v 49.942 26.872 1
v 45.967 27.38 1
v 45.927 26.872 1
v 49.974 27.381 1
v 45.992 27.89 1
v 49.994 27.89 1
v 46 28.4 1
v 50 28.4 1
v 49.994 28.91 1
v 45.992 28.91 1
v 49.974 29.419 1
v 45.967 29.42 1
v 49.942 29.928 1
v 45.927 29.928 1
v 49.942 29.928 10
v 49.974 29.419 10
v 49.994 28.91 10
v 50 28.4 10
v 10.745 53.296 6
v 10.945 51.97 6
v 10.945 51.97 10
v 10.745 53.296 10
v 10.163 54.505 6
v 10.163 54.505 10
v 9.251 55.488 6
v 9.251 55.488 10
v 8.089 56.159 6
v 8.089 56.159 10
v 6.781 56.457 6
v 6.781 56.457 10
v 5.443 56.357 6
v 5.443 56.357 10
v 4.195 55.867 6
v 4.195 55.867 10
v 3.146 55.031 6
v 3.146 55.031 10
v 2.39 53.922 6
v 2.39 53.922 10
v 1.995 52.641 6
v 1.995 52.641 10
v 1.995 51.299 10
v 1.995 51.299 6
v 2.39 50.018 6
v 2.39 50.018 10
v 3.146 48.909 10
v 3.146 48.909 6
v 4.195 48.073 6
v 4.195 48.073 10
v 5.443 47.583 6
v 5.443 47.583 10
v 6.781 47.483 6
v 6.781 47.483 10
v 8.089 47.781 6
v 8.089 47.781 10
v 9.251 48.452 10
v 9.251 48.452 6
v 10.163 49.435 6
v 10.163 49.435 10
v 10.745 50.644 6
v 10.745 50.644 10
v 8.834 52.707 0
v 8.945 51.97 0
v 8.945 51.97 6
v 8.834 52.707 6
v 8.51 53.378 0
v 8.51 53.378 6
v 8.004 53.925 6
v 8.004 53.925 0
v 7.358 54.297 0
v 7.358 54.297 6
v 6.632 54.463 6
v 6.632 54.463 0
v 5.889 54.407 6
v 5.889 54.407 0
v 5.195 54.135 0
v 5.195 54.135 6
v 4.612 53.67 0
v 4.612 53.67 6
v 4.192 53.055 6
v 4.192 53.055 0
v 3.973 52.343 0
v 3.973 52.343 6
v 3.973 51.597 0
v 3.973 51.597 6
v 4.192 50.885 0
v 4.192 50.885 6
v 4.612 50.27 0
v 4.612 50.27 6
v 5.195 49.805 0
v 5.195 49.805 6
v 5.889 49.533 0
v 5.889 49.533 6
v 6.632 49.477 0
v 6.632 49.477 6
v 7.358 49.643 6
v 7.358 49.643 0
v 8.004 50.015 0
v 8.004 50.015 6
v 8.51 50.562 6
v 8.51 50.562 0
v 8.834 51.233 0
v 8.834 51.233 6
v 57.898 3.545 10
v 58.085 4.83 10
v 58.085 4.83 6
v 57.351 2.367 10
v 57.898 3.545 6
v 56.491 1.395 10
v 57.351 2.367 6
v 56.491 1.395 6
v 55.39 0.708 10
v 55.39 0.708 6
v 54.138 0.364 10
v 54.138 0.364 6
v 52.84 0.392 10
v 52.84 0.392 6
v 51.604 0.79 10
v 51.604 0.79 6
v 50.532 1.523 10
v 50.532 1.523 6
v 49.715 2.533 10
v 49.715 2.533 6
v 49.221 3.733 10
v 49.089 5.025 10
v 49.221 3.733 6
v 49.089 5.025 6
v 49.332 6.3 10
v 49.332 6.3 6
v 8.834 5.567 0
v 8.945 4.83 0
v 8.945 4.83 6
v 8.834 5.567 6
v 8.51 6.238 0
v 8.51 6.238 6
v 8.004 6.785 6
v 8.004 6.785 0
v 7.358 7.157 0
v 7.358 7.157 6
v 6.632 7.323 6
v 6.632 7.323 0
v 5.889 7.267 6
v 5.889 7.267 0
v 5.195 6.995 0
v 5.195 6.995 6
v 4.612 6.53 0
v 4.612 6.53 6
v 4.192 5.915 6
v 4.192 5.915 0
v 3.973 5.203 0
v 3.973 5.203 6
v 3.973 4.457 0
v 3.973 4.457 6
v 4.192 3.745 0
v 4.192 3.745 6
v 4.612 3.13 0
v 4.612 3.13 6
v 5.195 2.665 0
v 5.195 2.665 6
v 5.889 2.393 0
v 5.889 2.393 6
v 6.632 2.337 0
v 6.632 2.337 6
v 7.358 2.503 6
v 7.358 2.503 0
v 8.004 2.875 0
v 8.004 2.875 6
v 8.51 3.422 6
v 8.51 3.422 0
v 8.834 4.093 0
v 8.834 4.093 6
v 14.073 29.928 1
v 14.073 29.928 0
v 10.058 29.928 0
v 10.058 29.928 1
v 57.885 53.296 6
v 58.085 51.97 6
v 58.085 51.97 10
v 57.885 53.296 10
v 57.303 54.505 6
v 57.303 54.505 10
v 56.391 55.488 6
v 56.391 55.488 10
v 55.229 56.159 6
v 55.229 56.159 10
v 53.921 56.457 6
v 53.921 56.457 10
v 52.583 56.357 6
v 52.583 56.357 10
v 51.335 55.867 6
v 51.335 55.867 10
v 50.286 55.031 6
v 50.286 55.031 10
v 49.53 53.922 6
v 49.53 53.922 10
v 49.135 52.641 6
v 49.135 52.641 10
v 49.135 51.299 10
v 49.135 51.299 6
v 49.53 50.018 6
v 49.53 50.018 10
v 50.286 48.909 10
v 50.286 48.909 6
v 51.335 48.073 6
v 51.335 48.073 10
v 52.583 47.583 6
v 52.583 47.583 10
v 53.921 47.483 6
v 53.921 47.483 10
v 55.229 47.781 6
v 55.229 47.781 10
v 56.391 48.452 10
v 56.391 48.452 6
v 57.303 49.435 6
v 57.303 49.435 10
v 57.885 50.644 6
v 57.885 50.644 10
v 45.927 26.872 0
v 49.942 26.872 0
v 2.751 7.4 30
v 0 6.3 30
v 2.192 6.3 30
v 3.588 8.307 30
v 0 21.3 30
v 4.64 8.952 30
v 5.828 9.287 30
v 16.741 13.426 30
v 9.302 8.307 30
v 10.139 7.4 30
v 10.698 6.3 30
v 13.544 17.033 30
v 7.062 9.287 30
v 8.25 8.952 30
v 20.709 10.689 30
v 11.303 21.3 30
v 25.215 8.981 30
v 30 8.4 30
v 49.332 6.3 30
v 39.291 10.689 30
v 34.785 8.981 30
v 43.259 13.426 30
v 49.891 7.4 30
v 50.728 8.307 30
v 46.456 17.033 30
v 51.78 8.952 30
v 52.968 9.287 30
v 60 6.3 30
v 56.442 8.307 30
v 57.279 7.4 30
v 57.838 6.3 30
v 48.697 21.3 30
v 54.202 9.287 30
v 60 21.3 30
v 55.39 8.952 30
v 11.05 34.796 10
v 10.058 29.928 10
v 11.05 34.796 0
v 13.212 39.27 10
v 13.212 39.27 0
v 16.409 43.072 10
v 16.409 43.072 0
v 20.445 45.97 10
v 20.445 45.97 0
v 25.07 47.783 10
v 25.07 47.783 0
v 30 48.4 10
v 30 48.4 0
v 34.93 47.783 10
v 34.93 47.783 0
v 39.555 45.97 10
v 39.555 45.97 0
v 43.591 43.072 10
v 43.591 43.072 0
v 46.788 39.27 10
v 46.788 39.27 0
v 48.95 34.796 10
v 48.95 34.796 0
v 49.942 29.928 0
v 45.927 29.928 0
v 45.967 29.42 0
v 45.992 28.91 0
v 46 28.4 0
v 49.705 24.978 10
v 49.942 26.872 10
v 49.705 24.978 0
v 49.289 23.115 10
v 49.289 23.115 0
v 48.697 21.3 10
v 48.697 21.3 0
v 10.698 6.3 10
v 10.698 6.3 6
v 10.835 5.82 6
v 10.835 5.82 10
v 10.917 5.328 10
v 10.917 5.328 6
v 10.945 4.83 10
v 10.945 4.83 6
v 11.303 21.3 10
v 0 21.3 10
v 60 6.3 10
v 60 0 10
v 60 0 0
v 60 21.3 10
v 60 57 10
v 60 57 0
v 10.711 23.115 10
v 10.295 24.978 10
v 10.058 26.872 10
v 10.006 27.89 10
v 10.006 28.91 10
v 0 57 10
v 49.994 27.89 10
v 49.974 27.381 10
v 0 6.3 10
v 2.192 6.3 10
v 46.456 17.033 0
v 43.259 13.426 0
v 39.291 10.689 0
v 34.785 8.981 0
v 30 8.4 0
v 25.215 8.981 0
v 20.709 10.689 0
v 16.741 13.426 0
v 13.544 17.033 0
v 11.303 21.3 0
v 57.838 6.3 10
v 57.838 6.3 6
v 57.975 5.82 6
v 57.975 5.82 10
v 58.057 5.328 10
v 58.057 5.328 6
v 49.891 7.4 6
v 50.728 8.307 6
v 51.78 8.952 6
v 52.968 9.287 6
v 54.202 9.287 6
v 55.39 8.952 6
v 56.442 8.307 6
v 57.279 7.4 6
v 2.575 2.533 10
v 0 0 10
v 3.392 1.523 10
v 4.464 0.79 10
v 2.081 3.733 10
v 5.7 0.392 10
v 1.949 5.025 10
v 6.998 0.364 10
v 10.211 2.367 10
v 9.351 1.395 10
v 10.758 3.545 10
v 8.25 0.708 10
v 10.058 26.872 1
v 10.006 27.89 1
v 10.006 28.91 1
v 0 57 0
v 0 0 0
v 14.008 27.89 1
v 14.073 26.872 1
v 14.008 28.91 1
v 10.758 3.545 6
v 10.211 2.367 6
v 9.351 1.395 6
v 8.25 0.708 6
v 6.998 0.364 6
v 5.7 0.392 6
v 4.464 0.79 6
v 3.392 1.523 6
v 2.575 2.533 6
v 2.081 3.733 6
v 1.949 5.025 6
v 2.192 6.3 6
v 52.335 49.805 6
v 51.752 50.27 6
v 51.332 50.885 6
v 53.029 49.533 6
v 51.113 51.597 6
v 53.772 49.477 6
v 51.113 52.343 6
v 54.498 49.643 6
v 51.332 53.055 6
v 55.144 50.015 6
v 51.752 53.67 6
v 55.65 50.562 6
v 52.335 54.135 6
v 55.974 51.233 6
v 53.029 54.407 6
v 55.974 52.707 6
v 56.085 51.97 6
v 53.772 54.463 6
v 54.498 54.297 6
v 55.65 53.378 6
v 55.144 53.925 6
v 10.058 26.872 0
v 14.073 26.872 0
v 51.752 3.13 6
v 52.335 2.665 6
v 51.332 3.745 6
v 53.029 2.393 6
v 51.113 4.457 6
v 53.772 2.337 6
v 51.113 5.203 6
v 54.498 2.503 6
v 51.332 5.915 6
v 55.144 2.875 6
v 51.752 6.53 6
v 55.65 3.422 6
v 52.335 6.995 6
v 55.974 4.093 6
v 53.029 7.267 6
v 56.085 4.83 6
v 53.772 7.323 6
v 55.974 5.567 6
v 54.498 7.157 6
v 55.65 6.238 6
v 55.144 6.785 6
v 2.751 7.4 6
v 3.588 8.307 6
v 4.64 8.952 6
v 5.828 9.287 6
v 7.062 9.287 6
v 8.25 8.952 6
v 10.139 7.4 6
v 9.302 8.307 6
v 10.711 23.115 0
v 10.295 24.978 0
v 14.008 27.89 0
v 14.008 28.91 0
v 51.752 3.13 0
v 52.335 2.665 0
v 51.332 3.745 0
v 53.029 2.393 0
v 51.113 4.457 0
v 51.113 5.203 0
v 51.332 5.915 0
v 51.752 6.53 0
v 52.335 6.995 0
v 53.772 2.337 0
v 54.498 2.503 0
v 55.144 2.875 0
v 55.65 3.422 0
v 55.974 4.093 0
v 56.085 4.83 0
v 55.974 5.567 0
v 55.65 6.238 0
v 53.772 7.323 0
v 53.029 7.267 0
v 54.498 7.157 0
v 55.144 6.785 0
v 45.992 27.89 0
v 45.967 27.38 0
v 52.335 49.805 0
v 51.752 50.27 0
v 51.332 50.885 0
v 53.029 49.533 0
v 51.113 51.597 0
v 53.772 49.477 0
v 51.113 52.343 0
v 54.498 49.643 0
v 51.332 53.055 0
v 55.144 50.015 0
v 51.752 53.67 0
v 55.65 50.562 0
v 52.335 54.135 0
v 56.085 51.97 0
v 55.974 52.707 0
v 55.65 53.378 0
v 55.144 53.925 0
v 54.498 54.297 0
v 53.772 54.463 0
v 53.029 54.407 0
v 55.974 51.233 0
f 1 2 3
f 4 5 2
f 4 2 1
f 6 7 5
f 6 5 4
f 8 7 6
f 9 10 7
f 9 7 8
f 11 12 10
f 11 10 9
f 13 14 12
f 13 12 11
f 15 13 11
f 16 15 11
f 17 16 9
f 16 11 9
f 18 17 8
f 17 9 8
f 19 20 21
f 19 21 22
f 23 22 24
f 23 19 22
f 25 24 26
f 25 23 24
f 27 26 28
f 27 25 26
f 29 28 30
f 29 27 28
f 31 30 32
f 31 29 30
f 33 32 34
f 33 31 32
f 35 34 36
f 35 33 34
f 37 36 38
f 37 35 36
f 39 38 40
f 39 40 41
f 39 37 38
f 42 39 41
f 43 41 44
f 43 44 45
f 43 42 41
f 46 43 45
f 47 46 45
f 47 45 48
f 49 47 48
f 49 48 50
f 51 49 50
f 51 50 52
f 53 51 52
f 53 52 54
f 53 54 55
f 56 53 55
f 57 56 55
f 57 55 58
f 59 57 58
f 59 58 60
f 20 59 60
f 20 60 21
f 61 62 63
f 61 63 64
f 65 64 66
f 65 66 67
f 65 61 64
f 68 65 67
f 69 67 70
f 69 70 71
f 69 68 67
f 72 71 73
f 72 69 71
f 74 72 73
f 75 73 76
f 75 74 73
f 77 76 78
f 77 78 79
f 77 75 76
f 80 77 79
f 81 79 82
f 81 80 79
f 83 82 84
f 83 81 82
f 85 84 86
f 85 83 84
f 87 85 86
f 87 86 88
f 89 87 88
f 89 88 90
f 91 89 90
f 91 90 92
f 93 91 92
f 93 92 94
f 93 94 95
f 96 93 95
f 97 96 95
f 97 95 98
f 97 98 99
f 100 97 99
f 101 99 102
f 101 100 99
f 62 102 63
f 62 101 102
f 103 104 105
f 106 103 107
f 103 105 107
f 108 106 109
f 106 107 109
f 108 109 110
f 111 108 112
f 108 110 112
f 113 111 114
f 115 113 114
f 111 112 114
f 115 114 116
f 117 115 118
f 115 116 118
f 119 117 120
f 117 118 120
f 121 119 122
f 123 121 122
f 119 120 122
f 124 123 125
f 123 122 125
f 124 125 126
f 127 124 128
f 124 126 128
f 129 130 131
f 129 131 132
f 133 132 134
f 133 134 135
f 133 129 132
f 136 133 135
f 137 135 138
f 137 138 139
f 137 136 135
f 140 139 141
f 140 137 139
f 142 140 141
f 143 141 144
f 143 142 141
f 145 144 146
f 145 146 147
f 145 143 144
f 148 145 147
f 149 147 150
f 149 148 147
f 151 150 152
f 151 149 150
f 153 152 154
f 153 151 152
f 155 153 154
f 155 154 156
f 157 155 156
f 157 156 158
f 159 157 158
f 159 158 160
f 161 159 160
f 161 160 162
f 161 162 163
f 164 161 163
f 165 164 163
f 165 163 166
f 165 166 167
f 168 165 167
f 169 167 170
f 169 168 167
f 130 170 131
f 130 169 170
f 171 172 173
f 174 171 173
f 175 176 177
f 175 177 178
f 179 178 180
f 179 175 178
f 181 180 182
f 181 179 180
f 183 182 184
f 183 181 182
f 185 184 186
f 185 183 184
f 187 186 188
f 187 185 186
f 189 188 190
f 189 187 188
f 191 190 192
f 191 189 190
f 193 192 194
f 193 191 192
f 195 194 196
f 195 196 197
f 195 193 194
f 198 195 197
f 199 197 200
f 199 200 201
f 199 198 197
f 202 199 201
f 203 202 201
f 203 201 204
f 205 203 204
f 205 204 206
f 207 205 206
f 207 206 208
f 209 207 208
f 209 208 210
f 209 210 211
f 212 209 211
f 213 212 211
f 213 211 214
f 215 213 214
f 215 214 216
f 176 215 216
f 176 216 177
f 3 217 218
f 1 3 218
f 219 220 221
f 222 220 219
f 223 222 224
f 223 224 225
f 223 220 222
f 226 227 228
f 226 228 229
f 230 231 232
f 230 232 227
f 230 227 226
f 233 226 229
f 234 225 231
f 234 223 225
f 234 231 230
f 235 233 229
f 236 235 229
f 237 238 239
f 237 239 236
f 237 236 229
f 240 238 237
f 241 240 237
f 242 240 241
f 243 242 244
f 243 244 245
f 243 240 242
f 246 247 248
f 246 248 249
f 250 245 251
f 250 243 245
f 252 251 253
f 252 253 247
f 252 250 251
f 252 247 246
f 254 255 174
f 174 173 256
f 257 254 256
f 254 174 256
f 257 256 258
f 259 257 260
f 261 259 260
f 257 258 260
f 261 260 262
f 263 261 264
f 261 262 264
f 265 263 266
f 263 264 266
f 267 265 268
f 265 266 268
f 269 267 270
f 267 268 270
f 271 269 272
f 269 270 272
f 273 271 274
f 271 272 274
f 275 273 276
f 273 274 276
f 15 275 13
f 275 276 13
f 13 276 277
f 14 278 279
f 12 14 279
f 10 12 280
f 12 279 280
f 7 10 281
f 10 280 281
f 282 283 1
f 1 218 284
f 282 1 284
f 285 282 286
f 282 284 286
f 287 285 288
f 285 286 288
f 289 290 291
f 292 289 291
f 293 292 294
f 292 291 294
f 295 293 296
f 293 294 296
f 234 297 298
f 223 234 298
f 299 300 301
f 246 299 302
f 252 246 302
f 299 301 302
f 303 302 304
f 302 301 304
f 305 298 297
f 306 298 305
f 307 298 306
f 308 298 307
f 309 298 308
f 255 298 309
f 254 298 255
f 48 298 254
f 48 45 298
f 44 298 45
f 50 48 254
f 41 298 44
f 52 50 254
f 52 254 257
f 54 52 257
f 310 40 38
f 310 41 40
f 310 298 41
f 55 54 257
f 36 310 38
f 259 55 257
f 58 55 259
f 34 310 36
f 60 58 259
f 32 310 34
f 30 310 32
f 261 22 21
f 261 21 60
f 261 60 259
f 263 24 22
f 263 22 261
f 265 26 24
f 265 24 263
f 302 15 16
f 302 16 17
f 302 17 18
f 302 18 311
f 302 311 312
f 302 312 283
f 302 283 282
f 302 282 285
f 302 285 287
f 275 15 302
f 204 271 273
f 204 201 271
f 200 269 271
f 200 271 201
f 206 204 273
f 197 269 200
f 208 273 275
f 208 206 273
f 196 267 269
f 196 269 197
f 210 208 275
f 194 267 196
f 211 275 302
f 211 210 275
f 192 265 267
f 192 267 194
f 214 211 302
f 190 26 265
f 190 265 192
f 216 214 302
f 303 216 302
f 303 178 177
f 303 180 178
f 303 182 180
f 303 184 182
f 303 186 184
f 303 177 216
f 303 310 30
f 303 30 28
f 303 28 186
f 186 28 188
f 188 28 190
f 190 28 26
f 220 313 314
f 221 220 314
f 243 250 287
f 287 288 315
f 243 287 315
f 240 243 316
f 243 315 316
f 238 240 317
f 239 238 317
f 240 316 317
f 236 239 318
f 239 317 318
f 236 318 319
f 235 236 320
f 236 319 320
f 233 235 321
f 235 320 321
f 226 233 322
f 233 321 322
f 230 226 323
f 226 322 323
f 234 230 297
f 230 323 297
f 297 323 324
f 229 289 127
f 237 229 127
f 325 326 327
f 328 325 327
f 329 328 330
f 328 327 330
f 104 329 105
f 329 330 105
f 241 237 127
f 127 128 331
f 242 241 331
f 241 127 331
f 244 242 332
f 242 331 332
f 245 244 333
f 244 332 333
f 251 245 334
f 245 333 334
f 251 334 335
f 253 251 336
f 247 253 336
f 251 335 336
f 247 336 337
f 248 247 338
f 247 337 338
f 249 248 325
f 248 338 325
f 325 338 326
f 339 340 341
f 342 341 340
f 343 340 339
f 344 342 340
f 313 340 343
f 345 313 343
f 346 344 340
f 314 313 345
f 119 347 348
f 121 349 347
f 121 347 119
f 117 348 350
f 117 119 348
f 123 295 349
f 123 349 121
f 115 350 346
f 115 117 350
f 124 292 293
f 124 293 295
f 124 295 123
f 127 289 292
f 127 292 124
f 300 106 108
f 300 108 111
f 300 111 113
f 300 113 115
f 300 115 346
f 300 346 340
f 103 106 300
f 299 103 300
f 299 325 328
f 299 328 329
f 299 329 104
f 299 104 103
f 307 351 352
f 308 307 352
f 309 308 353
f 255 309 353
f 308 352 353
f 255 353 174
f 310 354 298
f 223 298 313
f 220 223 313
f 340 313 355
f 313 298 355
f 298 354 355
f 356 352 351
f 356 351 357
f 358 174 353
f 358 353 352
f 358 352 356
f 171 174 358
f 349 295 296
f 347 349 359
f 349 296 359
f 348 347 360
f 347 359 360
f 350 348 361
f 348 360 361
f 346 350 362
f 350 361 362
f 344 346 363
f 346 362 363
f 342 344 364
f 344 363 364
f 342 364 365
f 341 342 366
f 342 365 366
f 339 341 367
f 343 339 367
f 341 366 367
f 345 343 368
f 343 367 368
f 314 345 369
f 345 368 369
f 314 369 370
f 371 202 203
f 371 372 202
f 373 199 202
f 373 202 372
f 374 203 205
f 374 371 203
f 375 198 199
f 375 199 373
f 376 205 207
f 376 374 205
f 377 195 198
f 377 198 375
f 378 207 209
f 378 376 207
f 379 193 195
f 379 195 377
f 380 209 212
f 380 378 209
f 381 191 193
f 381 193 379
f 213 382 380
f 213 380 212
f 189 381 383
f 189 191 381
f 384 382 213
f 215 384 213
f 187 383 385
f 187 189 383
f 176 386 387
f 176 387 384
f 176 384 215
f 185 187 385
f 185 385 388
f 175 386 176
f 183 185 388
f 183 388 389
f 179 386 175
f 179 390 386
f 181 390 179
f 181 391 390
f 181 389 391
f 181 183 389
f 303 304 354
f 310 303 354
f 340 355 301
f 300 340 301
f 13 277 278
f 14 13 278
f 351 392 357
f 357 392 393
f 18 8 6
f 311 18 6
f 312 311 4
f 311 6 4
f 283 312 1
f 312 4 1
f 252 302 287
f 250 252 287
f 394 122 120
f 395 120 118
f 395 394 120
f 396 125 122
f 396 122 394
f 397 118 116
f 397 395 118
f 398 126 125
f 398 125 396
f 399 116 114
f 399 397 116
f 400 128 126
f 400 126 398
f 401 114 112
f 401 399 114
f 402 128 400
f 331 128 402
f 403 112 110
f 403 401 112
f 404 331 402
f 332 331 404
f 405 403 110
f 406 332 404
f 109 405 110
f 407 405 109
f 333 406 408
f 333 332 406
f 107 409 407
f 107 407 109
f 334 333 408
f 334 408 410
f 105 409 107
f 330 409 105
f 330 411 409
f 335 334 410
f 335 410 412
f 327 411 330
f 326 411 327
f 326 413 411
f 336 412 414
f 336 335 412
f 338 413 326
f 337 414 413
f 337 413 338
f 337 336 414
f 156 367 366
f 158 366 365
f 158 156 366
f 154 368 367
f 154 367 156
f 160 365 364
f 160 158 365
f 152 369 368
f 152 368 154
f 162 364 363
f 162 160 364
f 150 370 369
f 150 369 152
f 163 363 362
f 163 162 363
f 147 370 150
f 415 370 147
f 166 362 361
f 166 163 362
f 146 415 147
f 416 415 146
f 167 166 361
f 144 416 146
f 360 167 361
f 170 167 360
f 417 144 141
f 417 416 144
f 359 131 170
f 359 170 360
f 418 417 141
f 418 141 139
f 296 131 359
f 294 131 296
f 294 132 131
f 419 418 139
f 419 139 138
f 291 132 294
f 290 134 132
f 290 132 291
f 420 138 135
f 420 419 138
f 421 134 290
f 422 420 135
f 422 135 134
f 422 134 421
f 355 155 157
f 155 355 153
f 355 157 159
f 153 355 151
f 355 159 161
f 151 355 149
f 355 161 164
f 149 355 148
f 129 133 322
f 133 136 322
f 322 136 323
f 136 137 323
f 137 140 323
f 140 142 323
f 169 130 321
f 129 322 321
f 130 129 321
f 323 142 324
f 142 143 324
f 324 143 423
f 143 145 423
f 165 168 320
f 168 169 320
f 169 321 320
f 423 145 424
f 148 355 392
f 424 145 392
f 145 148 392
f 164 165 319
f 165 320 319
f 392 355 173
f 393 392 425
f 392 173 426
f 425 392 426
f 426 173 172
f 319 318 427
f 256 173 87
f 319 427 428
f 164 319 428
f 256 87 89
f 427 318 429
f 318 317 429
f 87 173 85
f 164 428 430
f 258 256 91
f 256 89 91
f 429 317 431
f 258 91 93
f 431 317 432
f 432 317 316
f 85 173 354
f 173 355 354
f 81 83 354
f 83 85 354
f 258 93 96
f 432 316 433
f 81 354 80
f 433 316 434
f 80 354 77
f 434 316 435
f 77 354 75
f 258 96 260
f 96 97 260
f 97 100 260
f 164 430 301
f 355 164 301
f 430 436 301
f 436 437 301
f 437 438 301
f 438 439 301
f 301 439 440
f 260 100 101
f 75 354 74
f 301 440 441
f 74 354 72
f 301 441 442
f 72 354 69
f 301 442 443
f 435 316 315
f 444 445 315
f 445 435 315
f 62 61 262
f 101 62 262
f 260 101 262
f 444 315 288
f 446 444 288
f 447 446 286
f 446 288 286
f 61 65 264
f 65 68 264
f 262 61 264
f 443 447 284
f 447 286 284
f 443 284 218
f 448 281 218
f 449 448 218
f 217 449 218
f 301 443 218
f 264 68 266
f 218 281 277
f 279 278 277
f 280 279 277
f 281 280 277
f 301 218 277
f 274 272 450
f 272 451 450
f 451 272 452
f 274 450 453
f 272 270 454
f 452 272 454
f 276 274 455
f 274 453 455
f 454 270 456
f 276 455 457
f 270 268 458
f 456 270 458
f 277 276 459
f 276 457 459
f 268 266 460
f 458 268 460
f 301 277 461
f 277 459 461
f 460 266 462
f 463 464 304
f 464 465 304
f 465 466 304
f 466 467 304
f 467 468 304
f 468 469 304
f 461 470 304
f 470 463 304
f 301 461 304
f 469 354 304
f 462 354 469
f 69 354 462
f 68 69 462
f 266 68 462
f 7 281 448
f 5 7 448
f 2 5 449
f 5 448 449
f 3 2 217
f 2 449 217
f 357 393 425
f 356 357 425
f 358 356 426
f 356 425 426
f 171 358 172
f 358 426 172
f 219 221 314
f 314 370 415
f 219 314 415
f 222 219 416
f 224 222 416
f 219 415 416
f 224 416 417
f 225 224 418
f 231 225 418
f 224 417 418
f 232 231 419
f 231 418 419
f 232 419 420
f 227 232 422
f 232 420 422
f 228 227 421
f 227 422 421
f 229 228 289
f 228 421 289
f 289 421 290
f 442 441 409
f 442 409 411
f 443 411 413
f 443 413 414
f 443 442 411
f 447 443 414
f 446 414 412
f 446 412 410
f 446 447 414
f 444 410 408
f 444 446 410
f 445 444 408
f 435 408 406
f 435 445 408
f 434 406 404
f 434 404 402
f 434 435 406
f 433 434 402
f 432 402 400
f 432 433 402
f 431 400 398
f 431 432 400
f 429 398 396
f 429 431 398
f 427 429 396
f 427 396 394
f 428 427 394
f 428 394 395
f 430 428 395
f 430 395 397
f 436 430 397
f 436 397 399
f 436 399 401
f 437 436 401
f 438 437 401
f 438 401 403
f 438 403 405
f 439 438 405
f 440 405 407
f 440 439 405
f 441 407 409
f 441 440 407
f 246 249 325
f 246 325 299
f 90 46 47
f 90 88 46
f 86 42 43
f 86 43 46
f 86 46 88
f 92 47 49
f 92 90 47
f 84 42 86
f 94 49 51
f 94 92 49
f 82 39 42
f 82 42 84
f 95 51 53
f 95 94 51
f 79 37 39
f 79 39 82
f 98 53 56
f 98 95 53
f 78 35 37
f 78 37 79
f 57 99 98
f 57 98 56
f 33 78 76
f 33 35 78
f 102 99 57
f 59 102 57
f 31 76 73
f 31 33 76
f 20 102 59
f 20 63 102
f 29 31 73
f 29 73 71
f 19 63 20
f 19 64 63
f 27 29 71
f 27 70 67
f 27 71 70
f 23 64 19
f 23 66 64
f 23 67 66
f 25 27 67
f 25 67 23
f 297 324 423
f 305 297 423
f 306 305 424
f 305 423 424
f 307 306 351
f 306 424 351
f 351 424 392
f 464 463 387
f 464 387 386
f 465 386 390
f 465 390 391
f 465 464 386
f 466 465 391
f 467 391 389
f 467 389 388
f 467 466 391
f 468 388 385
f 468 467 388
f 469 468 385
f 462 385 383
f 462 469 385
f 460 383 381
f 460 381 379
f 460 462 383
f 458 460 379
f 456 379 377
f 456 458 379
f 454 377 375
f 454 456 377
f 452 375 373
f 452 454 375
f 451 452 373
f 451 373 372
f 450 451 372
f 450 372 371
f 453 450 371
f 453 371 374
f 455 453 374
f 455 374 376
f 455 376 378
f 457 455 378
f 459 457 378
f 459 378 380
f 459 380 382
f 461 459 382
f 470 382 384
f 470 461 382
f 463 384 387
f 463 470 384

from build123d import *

# Parameters (mm, degrees)
F0_R     = 4.5
F1_DEPTH = 10
F2_DEPTH = 30
F3_DEPTH = 10
F0_R_2   = 2.5
F4_DEPTH = 6
F5_DEPTH = 6
F6_DEPTH = 6
F7_DEPTH = 1


with BuildPart() as f1:
    # F0 (on Top) → F1 (new body)
    with BuildSketch(Plane.XY):
        with BuildLine():
            Line((0, 57), (0, 21.3))
            Line((0, 21.3), (11.302673988, 21.3))
            ThreePointArc((11.302673988, 21.3), (10.4807134754, 24.0413931616), (10.0584521038, 26.8720381207))
            ThreePointArc((10.0584521038, 26.8720381207), (10, 28.4), (10.0584521038, 29.9279618793))
            ThreePointArc((10.0584521038, 29.9279618793), (30, 48.4), (49.9415478962, 29.9279618793))
            ThreePointArc((49.9415478962, 29.9279618793), (49.9853816316, 29.1645397558), (50, 28.4))
            ThreePointArc((50, 28.4), (49.9853816316, 27.6354602442), (49.9415478962, 26.8720381207))
            ThreePointArc((49.9415478962, 26.8720381207), (49.5192865246, 24.0413931616), (48.697326012, 21.3))
            Line((48.697326012, 21.3), (60, 21.3))
            Line((60, 21.3), (60, 57))
            Line((60, 57), (0, 57))
        make_face()
        with Locations((6.4448192716, 51.97)):
            Circle(F0_R, mode=Mode.SUBTRACT)
        with Locations((53.5848192716, 51.97)):
            Circle(F0_R, mode=Mode.SUBTRACT)
    extrude(amount=F1_DEPTH)

    # F0 (on Top) → F2 (join)
    with BuildSketch(Plane.XY):
        with BuildLine():
            Line((0, 21.3), (0, 6.3))
            Line((0, 6.3), (2.1916910111, 6.3))
            ThreePointArc((2.1916910111, 6.3), (6.4448192716, 9.33), (10.697947532, 6.3))
            Line((10.697947532, 6.3), (49.3316910111, 6.3))
            ThreePointArc((49.3316910111, 6.3), (53.5848192716, 9.33), (57.837947532, 6.3))
            Line((57.837947532, 6.3), (60, 6.3))
            Line((60, 6.3), (60, 21.3))
            Line((60, 21.3), (48.697326012, 21.3))
            ThreePointArc((48.697326012, 21.3), (30, 8.4), (11.302673988, 21.3))
            Line((11.302673988, 21.3), (0, 21.3))
        make_face()
    extrude(amount=F2_DEPTH)

    # F0 (on Top) → F3 (join)
    with BuildSketch(Plane.XY):
        with BuildLine():
            Line((0, 6.3), (0, 0))
            Line((0, 0), (60, 0))
            Line((60, 0), (60, 6.3))
            Line((60, 6.3), (57.837947532, 6.3))
            ThreePointArc((57.837947532, 6.3), (58.0226721968, 5.5752928377), (58.0848192716, 4.83))
            ThreePointArc((58.0848192716, 4.83), (52.8395264339, 0.3921470748), (49.3316910111, 6.3))
            Line((49.3316910111, 6.3), (10.697947532, 6.3))
            ThreePointArc((10.697947532, 6.3), (10.8826721968, 5.5752928377), (10.9448192716, 4.83))
            ThreePointArc((10.9448192716, 4.83), (5.6995264339, 0.3921470748), (2.1916910111, 6.3))
            Line((2.1916910111, 6.3), (0, 6.3))
        make_face()
    extrude(amount=F3_DEPTH)

    # F0 (on Top) → F4 (join)
    with BuildSketch(Plane.XY):
        with BuildLine():
            ThreePointArc((10.697947532, 6.3), (6.4448192716, 9.33), (2.1916910111, 6.3))
            ThreePointArc((2.1916910111, 6.3), (5.6995264339, 0.3921470748), (10.9448192716, 4.83))
            ThreePointArc((10.9448192716, 4.83), (10.8826721968, 5.5752928377), (10.697947532, 6.3))
        make_face()
        with Locations((6.4448192716, 4.83)):
            Circle(F0_R_2, mode=Mode.SUBTRACT)
    extrude(amount=F4_DEPTH)

    # F0 (on Top) → F5 (join)
    with BuildSketch(Plane.XY):
        with BuildLine():
            ThreePointArc((58.0848192716, 4.83), (58.0226721968, 5.5752928377), (57.837947532, 6.3))
            ThreePointArc((57.837947532, 6.3), (53.5848192716, 9.33), (49.3316910111, 6.3))
            ThreePointArc((49.3316910111, 6.3), (52.8395264339, 0.3921470748), (58.0848192716, 4.83))
        make_face()
        with Locations((53.5848192716, 4.83)):
            Circle(F0_R_2, mode=Mode.SUBTRACT)
    extrude(amount=F5_DEPTH)

    # F0 (on Top) → F6 (join)
    with BuildSketch(Plane.XY):
        with Locations((6.4448192716, 51.97)):
            Circle(F0_R)
        with Locations((6.4448192716, 51.97)):
            Circle(F0_R_2, mode=Mode.SUBTRACT)
        with Locations((53.5848192716, 51.97)):
            Circle(F0_R)
        with Locations((53.5848192716, 51.97)):
            Circle(F0_R_2, mode=Mode.SUBTRACT)
    extrude(amount=F6_DEPTH)

    # F0 (on Top) → F7 (join)
    with BuildSketch(Plane.XY):
        with BuildLine():
            ThreePointArc((10.0584521038, 29.9279618793), (10, 28.4), (10.0584521038, 26.8720381207))
            Line((10.0584521038, 26.8720381207), (14.0731254637, 26.8720381207))
            ThreePointArc((14.0731254637, 26.8720381207), (14, 28.4), (14.0731254637, 29.9279618793))
            Line((14.0731254637, 29.9279618793), (10.0584521038, 29.9279618793))
        make_face()
        with BuildLine():
            Line((45.9268745363, 26.8720381207), (49.9415478962, 26.8720381207))
            ThreePointArc((49.9415478962, 26.8720381207), (49.9853816316, 27.6354602442), (50, 28.4))
            ThreePointArc((50, 28.4), (49.9853816316, 29.1645397558), (49.9415478962, 29.9279618793))
            Line((49.9415478962, 29.9279618793), (45.9268745363, 29.9279618793))
            ThreePointArc((45.9268745363, 29.9279618793), (45.9817081781, 29.164855352), (46, 28.4))
            ThreePointArc((46, 28.4), (45.9817081781, 27.635144648), (45.9268745363, 26.8720381207))
        make_face()
    extrude(amount=F7_DEPTH)


solid = f1.part
